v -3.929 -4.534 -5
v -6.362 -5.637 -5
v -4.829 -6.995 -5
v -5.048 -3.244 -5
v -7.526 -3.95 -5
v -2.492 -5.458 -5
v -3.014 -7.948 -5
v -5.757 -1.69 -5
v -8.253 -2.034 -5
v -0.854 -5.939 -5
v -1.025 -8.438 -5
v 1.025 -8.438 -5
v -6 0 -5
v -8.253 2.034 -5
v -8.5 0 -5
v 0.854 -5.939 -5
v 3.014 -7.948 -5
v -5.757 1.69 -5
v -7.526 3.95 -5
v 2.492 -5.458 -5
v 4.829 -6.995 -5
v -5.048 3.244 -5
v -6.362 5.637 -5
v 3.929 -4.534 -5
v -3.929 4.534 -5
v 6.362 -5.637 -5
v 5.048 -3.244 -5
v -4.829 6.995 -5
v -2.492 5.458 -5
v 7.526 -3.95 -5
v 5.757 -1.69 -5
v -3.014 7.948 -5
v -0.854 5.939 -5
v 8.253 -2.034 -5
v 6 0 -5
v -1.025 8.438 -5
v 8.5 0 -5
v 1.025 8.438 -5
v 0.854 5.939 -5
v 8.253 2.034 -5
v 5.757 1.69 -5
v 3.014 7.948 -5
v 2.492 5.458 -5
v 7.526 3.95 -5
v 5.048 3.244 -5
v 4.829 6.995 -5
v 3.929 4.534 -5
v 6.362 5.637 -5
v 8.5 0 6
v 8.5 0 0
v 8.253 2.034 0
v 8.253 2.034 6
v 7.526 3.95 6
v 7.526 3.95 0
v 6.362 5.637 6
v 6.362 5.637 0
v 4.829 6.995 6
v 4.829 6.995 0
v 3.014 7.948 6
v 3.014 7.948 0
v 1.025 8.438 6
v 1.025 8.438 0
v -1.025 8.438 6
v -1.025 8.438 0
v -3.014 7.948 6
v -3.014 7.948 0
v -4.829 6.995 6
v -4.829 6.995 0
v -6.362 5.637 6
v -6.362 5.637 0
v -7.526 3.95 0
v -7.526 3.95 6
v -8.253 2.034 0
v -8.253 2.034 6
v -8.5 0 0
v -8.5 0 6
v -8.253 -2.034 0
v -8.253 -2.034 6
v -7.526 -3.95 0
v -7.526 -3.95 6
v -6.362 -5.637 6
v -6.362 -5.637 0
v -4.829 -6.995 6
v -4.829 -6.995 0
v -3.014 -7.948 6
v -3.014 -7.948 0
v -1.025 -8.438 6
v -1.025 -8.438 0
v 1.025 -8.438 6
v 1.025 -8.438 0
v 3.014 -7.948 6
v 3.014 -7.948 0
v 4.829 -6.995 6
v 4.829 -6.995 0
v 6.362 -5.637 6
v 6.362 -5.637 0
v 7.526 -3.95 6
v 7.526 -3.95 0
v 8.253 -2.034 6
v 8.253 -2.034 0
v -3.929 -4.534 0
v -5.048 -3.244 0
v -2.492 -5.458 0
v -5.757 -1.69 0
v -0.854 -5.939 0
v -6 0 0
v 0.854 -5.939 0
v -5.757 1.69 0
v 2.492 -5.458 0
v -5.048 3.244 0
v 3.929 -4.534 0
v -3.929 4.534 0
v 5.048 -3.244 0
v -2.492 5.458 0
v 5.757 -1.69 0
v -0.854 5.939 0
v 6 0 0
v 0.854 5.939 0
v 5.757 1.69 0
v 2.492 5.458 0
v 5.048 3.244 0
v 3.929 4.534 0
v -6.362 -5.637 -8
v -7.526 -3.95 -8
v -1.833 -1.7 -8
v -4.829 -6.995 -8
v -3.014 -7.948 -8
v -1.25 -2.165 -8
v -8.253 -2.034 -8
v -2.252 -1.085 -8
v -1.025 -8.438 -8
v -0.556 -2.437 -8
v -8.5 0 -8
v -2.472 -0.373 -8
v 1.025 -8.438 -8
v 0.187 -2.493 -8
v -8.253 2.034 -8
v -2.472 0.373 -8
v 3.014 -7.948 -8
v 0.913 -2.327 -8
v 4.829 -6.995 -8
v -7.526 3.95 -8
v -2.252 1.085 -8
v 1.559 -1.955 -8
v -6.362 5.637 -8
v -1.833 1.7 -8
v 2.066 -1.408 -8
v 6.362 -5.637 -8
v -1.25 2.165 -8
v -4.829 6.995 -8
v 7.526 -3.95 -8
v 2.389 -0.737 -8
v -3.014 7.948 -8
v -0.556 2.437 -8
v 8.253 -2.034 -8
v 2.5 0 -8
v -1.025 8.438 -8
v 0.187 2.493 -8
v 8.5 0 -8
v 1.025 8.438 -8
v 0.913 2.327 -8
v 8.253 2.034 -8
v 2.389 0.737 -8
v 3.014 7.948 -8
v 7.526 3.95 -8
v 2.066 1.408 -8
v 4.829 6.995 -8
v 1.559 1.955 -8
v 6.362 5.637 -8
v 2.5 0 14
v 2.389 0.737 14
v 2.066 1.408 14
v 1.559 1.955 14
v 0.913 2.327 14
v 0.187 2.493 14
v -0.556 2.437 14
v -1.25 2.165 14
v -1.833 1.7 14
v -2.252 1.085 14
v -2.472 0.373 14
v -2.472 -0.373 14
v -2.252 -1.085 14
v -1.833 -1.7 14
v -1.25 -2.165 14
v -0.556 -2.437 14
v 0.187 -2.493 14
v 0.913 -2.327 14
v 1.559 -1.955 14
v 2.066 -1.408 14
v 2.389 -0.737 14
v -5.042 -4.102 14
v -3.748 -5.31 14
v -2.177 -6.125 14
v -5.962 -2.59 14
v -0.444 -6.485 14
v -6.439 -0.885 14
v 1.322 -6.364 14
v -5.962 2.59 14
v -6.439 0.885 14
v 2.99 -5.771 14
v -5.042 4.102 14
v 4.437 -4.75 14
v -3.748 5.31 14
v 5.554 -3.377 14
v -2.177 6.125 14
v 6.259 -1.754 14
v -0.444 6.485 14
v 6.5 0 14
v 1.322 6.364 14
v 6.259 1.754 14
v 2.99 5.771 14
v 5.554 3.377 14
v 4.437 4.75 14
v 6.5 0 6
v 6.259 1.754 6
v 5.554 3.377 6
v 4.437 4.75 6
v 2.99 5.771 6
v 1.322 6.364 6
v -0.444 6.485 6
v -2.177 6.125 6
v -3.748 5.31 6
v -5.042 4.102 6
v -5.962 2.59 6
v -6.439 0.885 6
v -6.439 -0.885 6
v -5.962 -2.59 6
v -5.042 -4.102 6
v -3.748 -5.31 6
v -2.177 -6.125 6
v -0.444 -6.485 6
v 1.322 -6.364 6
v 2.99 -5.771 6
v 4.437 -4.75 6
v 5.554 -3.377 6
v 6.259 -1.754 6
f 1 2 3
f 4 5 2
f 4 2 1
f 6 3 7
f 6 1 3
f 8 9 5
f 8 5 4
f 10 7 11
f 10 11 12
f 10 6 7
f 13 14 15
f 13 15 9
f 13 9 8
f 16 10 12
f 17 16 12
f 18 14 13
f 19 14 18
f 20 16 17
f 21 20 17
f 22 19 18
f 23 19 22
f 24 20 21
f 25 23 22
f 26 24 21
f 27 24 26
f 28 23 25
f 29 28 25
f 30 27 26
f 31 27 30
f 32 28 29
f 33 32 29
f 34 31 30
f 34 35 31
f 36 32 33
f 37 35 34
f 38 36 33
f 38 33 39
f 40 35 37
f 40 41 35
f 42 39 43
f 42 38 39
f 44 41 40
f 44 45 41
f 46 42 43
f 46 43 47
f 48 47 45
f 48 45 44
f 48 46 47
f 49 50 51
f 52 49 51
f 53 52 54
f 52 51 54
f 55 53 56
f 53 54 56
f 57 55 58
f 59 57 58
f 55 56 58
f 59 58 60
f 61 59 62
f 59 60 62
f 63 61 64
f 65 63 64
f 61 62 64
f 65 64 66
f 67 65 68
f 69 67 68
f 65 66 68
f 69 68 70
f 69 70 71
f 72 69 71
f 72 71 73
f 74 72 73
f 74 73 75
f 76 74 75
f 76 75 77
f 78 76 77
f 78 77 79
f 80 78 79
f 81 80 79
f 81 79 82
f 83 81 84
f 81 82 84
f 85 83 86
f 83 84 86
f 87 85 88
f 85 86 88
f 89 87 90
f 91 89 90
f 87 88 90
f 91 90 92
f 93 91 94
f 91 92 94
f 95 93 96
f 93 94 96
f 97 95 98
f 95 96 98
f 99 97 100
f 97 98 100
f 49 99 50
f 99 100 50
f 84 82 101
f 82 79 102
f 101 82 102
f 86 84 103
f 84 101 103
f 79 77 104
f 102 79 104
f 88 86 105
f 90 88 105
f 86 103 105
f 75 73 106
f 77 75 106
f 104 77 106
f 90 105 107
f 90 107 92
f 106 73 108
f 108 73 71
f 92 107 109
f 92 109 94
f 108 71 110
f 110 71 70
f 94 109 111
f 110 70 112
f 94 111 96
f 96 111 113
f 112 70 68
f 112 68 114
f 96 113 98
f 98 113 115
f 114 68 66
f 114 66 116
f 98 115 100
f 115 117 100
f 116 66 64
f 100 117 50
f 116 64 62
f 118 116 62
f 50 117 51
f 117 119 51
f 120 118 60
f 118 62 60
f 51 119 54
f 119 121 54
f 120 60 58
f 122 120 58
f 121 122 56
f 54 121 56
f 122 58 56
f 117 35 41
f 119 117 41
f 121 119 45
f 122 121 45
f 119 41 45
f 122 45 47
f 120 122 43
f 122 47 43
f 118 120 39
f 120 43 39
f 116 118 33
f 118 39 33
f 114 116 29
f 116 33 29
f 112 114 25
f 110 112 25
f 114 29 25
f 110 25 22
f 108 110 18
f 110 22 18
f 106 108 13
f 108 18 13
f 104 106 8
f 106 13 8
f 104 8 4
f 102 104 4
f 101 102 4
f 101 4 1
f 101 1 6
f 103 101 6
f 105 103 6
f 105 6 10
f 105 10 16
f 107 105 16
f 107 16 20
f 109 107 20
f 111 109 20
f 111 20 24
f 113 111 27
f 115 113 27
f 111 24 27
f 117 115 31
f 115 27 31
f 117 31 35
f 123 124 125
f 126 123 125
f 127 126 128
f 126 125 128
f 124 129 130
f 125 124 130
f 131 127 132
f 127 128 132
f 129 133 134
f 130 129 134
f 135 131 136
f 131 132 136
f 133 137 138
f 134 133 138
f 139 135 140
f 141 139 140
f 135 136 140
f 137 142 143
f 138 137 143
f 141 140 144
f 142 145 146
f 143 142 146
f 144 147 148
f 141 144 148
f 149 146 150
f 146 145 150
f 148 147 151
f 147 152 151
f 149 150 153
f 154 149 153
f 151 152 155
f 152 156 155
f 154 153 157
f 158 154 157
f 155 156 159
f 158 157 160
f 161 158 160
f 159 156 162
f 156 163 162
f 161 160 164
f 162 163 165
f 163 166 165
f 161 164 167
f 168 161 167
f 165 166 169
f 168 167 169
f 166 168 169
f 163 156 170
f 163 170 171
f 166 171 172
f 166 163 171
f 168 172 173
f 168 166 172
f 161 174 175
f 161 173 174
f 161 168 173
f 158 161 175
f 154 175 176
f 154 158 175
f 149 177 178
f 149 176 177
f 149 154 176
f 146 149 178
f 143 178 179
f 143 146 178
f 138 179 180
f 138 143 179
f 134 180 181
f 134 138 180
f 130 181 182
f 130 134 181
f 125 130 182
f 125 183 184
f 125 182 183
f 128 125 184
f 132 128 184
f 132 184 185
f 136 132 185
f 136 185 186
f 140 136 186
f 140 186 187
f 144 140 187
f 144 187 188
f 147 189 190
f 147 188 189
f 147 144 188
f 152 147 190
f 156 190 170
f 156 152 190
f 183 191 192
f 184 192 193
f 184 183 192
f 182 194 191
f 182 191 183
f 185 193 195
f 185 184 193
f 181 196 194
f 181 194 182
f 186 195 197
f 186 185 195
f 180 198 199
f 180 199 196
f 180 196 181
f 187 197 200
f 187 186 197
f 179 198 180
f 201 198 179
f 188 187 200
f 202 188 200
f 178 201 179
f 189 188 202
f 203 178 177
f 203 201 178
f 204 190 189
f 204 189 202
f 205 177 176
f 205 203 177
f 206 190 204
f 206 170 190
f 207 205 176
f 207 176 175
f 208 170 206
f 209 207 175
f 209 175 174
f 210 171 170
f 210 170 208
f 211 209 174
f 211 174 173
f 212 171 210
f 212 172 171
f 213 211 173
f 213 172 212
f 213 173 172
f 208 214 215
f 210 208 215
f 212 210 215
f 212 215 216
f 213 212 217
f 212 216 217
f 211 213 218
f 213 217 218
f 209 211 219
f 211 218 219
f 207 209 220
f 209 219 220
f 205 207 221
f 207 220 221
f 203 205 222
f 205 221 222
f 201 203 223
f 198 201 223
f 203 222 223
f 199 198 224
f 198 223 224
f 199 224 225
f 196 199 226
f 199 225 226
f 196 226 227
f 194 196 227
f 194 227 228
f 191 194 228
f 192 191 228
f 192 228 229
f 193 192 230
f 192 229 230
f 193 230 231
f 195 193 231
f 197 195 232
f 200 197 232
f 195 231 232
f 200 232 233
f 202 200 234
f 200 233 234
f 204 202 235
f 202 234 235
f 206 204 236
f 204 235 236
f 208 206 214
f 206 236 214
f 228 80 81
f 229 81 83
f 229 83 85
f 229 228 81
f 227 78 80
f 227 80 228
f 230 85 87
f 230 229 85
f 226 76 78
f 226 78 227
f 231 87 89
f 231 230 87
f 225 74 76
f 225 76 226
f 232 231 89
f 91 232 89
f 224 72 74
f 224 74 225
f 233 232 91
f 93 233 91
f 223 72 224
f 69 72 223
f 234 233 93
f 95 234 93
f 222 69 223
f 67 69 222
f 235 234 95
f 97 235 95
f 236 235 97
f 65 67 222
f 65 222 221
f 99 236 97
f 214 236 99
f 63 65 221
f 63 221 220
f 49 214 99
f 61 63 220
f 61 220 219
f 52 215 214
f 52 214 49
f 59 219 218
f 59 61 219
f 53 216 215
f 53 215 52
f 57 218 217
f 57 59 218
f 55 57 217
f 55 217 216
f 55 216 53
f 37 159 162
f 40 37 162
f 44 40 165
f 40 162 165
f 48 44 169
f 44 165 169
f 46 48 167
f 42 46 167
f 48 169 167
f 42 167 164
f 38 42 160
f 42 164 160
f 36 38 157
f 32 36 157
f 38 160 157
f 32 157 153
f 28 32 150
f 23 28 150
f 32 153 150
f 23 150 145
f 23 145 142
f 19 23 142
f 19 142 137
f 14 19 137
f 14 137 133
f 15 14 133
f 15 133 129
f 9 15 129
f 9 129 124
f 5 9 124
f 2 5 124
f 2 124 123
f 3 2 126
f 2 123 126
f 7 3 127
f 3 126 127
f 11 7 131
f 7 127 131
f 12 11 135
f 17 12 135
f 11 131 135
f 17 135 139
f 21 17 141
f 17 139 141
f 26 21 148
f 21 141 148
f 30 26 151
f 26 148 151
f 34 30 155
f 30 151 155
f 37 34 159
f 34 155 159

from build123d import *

# Parameters (mm, degrees)
THREAD_START          = -5
SKETCH1_R             = 6
THREAD_DEPTH          = 5
LOCK_NUT_START        = -8
SKETCH2_R             = 8.5
LOCK_NUT_DEPTH        = 3
SKETCH3_R             = 8.5
BODY_DEPTH            = 6
DOME_START            = 6
SKETCH4_R             = 6.5
DOME_DEPTH            = 8
CABLE_HOLE_DEPTH      = 19.452642087
CABLE_HOLE_DEPTH_BACK = 19.452642087
SKETCH5_R             = 2.5


with BuildPart() as part:
    # Sketch1 → Thread (new body)
    with BuildSketch(Plane.XY.offset(THREAD_START)):
        Circle(SKETCH1_R)
    extrude(amount=THREAD_DEPTH)

    # Sketch2 → Lock_Nut (add)
    with BuildSketch(Plane.XY.offset(LOCK_NUT_START)):
        Circle(SKETCH2_R)
    extrude(amount=LOCK_NUT_DEPTH)

    # Sketch3 → Body (add)
    with BuildSketch(Plane.XY):
        Circle(SKETCH3_R)
    extrude(amount=BODY_DEPTH)

    # Sketch4 → Dome (add)
    with BuildSketch(Plane.XY.offset(DOME_START)):
        Circle(SKETCH4_R)
    extrude(amount=DOME_DEPTH)

    # Sketch5 → Cable_Hole (cut, two sides: drawn at the far end of the back side and taken through both)
    with BuildSketch(Plane.XY.offset(-CABLE_HOLE_DEPTH_BACK)):
        Circle(SKETCH5_R)
    extrude(amount=CABLE_HOLE_DEPTH + CABLE_HOLE_DEPTH_BACK, mode=Mode.SUBTRACT)


solid = part.part
